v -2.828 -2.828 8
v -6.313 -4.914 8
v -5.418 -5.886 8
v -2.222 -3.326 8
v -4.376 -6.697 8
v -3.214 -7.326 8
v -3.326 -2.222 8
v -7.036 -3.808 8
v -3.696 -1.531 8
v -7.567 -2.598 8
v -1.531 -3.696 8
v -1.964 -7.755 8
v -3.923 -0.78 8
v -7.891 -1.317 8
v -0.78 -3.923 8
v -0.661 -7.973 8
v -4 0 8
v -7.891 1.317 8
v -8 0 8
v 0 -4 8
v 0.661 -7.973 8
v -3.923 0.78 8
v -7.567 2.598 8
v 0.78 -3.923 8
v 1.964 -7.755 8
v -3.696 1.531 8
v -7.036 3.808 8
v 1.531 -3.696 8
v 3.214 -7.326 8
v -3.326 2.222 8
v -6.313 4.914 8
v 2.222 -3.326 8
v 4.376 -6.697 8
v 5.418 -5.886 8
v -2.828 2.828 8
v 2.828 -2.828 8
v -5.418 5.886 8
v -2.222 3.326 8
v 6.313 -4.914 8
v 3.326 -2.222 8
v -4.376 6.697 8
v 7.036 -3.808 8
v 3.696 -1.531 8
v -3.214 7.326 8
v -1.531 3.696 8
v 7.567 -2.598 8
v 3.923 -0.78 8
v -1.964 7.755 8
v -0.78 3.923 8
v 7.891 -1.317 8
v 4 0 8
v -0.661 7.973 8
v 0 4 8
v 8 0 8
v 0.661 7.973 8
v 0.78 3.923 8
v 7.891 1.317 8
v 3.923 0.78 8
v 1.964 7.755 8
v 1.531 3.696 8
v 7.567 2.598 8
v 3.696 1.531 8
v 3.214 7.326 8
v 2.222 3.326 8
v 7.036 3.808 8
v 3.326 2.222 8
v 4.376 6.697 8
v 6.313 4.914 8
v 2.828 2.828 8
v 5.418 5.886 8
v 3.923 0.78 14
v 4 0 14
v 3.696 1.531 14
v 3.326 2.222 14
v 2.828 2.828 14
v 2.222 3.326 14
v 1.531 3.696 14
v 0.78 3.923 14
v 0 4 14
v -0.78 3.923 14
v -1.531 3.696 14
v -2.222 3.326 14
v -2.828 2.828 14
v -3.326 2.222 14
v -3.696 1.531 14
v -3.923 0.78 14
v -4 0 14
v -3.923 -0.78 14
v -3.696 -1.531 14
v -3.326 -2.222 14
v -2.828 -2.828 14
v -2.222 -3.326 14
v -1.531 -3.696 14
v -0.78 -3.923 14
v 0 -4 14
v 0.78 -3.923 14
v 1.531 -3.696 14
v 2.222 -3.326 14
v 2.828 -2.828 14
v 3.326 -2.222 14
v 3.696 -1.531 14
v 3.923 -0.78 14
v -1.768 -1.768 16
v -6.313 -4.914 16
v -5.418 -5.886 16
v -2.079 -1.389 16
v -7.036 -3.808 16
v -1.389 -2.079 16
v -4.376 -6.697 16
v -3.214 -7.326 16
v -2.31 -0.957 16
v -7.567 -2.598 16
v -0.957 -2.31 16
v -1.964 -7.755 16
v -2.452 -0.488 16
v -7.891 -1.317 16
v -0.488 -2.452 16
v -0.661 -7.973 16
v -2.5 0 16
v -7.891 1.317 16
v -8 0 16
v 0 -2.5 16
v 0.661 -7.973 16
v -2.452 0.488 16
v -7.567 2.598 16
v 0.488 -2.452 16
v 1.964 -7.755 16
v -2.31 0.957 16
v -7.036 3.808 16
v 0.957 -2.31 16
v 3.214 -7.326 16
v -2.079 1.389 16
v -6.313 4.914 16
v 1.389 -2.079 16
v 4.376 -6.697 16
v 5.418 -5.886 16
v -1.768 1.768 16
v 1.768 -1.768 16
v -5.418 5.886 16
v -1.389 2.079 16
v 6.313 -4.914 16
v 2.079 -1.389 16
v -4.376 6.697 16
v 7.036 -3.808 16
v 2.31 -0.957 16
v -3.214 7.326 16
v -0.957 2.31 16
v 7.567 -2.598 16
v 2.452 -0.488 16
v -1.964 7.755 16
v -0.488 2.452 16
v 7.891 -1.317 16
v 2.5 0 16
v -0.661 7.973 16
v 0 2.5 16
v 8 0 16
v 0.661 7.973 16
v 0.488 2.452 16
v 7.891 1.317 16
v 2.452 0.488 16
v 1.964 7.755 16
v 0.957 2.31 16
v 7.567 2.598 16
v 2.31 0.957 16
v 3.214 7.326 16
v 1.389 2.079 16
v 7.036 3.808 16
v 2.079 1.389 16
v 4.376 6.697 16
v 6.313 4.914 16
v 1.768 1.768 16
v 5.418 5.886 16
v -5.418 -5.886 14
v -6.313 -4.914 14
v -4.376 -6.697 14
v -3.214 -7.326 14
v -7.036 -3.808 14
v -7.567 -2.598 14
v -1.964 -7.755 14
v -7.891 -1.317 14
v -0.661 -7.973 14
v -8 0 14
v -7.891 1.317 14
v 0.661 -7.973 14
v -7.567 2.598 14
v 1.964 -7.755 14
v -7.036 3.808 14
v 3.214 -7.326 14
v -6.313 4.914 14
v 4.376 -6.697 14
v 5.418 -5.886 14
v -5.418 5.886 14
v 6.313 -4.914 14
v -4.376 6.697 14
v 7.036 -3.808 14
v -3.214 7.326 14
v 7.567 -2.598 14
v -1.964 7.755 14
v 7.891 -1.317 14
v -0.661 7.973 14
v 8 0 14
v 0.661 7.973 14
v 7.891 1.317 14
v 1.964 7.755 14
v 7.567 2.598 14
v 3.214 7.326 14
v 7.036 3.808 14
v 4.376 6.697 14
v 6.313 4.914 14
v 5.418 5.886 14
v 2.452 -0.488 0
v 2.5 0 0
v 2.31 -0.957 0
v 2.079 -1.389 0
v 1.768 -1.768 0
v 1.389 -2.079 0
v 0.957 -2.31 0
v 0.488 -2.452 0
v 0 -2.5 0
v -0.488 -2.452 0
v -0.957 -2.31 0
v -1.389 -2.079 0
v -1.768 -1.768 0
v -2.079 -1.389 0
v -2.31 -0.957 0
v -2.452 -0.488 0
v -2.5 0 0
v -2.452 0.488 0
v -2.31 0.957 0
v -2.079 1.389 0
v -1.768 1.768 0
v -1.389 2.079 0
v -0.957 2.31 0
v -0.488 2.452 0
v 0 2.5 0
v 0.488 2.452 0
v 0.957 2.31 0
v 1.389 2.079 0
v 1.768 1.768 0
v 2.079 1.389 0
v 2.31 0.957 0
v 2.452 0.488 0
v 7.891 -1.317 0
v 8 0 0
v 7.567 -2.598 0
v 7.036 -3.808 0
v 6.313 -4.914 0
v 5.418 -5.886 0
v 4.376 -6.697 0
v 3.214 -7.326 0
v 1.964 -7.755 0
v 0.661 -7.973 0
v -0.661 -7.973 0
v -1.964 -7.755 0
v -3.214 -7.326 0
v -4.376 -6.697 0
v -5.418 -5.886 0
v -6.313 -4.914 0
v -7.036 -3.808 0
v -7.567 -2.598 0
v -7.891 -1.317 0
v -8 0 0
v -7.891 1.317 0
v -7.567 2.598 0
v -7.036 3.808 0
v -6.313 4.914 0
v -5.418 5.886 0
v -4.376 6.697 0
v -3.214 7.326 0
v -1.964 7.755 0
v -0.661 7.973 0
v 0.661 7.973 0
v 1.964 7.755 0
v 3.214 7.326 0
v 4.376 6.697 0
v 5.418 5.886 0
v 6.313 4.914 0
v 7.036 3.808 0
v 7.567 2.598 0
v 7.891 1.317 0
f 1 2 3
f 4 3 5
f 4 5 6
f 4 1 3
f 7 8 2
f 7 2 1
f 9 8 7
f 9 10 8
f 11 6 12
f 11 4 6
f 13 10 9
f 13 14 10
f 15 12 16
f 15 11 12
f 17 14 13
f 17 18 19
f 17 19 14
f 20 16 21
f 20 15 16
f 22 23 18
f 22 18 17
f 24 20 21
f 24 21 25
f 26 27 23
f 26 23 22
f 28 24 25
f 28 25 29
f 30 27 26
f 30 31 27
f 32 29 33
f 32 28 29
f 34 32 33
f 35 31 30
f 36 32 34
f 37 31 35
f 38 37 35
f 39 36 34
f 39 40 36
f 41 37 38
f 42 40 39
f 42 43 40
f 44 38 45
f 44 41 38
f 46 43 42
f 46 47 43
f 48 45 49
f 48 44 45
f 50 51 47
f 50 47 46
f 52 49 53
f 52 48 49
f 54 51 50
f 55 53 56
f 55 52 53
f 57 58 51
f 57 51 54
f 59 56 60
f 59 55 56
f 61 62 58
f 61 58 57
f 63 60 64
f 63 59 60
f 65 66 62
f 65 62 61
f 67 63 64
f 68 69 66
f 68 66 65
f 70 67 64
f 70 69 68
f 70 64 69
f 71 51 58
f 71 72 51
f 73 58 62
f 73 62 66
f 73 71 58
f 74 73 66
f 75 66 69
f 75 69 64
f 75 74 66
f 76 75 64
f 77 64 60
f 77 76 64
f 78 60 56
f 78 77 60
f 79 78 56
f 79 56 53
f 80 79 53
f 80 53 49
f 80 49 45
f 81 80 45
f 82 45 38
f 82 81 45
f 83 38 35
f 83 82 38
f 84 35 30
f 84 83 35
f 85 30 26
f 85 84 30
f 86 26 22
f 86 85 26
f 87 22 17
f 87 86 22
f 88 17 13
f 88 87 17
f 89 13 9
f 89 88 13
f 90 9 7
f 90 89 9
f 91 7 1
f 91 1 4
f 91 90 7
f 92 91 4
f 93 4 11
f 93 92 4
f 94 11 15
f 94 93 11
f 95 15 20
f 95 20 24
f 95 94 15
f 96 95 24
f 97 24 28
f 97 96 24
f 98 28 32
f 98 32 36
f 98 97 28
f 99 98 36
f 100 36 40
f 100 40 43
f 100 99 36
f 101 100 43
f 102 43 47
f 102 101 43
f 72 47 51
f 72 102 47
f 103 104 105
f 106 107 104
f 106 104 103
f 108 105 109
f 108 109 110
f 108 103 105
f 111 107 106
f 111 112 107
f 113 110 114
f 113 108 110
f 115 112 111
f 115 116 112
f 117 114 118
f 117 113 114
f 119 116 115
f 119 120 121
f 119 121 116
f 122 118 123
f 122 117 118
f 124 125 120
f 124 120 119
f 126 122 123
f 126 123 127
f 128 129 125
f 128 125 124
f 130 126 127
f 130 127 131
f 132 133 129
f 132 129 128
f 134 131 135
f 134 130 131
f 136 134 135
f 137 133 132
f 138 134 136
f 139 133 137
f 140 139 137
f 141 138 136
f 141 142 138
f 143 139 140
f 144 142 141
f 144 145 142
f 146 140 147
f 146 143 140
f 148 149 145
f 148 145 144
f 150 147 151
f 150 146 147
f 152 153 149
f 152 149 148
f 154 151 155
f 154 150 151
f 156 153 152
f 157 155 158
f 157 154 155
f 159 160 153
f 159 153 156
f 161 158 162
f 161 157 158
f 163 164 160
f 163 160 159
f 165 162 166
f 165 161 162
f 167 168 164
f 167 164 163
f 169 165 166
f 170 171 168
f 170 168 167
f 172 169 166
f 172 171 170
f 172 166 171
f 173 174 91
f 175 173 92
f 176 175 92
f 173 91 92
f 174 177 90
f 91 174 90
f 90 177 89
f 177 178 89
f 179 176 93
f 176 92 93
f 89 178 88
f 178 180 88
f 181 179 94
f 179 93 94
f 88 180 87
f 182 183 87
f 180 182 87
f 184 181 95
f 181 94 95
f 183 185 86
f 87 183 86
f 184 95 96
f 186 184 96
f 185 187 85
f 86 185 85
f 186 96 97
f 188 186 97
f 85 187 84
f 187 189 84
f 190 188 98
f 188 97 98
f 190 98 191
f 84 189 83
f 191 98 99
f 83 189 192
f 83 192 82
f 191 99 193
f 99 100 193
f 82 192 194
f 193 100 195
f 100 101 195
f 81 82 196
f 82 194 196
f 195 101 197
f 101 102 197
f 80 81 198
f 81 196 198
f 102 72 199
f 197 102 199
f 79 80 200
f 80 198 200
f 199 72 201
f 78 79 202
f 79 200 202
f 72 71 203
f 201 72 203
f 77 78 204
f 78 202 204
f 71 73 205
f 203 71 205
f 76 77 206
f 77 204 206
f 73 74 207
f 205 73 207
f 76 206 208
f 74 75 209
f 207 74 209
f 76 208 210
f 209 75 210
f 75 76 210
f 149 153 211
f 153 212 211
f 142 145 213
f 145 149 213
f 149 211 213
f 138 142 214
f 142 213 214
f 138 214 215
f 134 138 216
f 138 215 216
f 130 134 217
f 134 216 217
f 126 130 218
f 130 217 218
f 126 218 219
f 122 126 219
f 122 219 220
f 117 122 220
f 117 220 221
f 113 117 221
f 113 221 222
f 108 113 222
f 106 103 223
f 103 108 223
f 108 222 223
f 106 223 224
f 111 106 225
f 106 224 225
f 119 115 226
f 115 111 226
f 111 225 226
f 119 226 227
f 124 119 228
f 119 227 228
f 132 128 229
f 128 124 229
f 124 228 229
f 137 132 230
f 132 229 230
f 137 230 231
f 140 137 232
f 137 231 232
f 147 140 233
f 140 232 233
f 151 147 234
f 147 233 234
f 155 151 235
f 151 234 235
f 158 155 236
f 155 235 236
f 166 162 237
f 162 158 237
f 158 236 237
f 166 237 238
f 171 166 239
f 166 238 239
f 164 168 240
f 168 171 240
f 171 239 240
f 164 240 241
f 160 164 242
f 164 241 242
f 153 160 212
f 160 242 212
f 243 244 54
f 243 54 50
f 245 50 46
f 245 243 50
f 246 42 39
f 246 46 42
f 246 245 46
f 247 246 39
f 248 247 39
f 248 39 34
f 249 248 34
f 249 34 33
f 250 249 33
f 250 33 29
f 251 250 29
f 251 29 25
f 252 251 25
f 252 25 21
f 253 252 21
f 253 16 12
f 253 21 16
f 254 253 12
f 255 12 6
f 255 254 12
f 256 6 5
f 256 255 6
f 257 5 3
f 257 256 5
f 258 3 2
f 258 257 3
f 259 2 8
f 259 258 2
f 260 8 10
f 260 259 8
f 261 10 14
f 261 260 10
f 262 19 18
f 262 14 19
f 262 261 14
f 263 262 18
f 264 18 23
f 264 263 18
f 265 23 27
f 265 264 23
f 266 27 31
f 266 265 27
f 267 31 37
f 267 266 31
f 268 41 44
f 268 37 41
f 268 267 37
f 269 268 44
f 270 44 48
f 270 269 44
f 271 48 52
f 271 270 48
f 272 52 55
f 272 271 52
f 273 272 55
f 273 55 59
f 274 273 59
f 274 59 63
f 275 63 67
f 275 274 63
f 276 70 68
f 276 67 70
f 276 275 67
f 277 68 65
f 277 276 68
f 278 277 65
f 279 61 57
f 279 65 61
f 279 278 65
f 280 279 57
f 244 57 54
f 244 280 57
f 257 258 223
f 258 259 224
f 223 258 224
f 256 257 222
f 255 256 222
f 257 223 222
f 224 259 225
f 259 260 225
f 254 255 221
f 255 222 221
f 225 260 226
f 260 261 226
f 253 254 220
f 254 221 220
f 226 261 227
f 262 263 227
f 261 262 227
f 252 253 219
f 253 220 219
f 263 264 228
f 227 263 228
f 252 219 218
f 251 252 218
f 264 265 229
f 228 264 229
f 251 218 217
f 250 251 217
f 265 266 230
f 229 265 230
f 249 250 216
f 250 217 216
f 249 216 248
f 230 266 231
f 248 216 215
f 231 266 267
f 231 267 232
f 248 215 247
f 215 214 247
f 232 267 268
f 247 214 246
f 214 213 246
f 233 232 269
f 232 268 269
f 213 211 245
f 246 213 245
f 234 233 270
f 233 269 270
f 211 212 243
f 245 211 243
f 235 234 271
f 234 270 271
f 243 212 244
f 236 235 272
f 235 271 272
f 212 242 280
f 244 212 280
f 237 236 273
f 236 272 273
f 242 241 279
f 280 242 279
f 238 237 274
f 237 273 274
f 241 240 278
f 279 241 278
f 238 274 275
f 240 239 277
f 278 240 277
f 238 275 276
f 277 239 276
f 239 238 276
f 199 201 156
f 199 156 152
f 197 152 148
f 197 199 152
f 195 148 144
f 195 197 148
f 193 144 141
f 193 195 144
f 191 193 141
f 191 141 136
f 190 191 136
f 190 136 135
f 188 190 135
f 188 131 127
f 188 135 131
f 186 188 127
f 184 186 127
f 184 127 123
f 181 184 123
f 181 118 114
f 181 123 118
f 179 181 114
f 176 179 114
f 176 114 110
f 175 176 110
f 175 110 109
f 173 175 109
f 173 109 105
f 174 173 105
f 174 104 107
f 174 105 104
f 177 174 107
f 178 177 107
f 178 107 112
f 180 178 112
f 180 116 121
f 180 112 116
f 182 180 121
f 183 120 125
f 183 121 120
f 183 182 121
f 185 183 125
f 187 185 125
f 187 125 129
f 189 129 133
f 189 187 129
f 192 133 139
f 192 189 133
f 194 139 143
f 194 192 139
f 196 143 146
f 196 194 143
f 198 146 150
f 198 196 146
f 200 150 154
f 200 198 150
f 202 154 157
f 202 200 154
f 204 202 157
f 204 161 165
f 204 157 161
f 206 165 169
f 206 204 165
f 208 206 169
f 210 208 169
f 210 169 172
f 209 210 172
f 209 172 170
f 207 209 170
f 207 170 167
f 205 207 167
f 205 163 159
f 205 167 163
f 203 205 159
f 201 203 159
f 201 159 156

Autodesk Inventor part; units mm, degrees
ref_plane "YZ Plane" through (0, 0, 0) normal (1, 0, 0) x (0, 1, 0)
ref_plane "XZ Plane" through (0, 0, 0) normal (0, 1, 0) x (-1, 0, 0)
sketch "Sketch1" plane through (0, 0, 0) normal (0, 0, 1) x (1, 0, 0)
  circle A0 centre (0, 0) radius 8
  circle A1 centre (0, 0) radius 2.5
  dimension "d0" = 16
  dimension "d3" = 5
extrude "Extrusion1" add sketch "Sketch1" along normal blind 16
ref_plane "Work Plane1" through (0, 0, 14) normal (0, 0, 1) x (1, 0, 0)
sketch "Sketch3" plane through (0, 0, 14) normal (0, 0, 1) x (1, 0, 0)
  circle A0 centre (0, 0) radius 8 projected
  circle A1 centre (0, 0) radius 2.5 projected
  circle A2 centre (0, 0) radius 2.5
  circle A3 centre (0, 0) radius 4
  dimension "d5" = 5
  dimension "d6" = 8
extrude "Extrusion2" cut sketch "Sketch3" against normal blind 6 contours A0
properties part number "pulley-small" material "Aluminum"
